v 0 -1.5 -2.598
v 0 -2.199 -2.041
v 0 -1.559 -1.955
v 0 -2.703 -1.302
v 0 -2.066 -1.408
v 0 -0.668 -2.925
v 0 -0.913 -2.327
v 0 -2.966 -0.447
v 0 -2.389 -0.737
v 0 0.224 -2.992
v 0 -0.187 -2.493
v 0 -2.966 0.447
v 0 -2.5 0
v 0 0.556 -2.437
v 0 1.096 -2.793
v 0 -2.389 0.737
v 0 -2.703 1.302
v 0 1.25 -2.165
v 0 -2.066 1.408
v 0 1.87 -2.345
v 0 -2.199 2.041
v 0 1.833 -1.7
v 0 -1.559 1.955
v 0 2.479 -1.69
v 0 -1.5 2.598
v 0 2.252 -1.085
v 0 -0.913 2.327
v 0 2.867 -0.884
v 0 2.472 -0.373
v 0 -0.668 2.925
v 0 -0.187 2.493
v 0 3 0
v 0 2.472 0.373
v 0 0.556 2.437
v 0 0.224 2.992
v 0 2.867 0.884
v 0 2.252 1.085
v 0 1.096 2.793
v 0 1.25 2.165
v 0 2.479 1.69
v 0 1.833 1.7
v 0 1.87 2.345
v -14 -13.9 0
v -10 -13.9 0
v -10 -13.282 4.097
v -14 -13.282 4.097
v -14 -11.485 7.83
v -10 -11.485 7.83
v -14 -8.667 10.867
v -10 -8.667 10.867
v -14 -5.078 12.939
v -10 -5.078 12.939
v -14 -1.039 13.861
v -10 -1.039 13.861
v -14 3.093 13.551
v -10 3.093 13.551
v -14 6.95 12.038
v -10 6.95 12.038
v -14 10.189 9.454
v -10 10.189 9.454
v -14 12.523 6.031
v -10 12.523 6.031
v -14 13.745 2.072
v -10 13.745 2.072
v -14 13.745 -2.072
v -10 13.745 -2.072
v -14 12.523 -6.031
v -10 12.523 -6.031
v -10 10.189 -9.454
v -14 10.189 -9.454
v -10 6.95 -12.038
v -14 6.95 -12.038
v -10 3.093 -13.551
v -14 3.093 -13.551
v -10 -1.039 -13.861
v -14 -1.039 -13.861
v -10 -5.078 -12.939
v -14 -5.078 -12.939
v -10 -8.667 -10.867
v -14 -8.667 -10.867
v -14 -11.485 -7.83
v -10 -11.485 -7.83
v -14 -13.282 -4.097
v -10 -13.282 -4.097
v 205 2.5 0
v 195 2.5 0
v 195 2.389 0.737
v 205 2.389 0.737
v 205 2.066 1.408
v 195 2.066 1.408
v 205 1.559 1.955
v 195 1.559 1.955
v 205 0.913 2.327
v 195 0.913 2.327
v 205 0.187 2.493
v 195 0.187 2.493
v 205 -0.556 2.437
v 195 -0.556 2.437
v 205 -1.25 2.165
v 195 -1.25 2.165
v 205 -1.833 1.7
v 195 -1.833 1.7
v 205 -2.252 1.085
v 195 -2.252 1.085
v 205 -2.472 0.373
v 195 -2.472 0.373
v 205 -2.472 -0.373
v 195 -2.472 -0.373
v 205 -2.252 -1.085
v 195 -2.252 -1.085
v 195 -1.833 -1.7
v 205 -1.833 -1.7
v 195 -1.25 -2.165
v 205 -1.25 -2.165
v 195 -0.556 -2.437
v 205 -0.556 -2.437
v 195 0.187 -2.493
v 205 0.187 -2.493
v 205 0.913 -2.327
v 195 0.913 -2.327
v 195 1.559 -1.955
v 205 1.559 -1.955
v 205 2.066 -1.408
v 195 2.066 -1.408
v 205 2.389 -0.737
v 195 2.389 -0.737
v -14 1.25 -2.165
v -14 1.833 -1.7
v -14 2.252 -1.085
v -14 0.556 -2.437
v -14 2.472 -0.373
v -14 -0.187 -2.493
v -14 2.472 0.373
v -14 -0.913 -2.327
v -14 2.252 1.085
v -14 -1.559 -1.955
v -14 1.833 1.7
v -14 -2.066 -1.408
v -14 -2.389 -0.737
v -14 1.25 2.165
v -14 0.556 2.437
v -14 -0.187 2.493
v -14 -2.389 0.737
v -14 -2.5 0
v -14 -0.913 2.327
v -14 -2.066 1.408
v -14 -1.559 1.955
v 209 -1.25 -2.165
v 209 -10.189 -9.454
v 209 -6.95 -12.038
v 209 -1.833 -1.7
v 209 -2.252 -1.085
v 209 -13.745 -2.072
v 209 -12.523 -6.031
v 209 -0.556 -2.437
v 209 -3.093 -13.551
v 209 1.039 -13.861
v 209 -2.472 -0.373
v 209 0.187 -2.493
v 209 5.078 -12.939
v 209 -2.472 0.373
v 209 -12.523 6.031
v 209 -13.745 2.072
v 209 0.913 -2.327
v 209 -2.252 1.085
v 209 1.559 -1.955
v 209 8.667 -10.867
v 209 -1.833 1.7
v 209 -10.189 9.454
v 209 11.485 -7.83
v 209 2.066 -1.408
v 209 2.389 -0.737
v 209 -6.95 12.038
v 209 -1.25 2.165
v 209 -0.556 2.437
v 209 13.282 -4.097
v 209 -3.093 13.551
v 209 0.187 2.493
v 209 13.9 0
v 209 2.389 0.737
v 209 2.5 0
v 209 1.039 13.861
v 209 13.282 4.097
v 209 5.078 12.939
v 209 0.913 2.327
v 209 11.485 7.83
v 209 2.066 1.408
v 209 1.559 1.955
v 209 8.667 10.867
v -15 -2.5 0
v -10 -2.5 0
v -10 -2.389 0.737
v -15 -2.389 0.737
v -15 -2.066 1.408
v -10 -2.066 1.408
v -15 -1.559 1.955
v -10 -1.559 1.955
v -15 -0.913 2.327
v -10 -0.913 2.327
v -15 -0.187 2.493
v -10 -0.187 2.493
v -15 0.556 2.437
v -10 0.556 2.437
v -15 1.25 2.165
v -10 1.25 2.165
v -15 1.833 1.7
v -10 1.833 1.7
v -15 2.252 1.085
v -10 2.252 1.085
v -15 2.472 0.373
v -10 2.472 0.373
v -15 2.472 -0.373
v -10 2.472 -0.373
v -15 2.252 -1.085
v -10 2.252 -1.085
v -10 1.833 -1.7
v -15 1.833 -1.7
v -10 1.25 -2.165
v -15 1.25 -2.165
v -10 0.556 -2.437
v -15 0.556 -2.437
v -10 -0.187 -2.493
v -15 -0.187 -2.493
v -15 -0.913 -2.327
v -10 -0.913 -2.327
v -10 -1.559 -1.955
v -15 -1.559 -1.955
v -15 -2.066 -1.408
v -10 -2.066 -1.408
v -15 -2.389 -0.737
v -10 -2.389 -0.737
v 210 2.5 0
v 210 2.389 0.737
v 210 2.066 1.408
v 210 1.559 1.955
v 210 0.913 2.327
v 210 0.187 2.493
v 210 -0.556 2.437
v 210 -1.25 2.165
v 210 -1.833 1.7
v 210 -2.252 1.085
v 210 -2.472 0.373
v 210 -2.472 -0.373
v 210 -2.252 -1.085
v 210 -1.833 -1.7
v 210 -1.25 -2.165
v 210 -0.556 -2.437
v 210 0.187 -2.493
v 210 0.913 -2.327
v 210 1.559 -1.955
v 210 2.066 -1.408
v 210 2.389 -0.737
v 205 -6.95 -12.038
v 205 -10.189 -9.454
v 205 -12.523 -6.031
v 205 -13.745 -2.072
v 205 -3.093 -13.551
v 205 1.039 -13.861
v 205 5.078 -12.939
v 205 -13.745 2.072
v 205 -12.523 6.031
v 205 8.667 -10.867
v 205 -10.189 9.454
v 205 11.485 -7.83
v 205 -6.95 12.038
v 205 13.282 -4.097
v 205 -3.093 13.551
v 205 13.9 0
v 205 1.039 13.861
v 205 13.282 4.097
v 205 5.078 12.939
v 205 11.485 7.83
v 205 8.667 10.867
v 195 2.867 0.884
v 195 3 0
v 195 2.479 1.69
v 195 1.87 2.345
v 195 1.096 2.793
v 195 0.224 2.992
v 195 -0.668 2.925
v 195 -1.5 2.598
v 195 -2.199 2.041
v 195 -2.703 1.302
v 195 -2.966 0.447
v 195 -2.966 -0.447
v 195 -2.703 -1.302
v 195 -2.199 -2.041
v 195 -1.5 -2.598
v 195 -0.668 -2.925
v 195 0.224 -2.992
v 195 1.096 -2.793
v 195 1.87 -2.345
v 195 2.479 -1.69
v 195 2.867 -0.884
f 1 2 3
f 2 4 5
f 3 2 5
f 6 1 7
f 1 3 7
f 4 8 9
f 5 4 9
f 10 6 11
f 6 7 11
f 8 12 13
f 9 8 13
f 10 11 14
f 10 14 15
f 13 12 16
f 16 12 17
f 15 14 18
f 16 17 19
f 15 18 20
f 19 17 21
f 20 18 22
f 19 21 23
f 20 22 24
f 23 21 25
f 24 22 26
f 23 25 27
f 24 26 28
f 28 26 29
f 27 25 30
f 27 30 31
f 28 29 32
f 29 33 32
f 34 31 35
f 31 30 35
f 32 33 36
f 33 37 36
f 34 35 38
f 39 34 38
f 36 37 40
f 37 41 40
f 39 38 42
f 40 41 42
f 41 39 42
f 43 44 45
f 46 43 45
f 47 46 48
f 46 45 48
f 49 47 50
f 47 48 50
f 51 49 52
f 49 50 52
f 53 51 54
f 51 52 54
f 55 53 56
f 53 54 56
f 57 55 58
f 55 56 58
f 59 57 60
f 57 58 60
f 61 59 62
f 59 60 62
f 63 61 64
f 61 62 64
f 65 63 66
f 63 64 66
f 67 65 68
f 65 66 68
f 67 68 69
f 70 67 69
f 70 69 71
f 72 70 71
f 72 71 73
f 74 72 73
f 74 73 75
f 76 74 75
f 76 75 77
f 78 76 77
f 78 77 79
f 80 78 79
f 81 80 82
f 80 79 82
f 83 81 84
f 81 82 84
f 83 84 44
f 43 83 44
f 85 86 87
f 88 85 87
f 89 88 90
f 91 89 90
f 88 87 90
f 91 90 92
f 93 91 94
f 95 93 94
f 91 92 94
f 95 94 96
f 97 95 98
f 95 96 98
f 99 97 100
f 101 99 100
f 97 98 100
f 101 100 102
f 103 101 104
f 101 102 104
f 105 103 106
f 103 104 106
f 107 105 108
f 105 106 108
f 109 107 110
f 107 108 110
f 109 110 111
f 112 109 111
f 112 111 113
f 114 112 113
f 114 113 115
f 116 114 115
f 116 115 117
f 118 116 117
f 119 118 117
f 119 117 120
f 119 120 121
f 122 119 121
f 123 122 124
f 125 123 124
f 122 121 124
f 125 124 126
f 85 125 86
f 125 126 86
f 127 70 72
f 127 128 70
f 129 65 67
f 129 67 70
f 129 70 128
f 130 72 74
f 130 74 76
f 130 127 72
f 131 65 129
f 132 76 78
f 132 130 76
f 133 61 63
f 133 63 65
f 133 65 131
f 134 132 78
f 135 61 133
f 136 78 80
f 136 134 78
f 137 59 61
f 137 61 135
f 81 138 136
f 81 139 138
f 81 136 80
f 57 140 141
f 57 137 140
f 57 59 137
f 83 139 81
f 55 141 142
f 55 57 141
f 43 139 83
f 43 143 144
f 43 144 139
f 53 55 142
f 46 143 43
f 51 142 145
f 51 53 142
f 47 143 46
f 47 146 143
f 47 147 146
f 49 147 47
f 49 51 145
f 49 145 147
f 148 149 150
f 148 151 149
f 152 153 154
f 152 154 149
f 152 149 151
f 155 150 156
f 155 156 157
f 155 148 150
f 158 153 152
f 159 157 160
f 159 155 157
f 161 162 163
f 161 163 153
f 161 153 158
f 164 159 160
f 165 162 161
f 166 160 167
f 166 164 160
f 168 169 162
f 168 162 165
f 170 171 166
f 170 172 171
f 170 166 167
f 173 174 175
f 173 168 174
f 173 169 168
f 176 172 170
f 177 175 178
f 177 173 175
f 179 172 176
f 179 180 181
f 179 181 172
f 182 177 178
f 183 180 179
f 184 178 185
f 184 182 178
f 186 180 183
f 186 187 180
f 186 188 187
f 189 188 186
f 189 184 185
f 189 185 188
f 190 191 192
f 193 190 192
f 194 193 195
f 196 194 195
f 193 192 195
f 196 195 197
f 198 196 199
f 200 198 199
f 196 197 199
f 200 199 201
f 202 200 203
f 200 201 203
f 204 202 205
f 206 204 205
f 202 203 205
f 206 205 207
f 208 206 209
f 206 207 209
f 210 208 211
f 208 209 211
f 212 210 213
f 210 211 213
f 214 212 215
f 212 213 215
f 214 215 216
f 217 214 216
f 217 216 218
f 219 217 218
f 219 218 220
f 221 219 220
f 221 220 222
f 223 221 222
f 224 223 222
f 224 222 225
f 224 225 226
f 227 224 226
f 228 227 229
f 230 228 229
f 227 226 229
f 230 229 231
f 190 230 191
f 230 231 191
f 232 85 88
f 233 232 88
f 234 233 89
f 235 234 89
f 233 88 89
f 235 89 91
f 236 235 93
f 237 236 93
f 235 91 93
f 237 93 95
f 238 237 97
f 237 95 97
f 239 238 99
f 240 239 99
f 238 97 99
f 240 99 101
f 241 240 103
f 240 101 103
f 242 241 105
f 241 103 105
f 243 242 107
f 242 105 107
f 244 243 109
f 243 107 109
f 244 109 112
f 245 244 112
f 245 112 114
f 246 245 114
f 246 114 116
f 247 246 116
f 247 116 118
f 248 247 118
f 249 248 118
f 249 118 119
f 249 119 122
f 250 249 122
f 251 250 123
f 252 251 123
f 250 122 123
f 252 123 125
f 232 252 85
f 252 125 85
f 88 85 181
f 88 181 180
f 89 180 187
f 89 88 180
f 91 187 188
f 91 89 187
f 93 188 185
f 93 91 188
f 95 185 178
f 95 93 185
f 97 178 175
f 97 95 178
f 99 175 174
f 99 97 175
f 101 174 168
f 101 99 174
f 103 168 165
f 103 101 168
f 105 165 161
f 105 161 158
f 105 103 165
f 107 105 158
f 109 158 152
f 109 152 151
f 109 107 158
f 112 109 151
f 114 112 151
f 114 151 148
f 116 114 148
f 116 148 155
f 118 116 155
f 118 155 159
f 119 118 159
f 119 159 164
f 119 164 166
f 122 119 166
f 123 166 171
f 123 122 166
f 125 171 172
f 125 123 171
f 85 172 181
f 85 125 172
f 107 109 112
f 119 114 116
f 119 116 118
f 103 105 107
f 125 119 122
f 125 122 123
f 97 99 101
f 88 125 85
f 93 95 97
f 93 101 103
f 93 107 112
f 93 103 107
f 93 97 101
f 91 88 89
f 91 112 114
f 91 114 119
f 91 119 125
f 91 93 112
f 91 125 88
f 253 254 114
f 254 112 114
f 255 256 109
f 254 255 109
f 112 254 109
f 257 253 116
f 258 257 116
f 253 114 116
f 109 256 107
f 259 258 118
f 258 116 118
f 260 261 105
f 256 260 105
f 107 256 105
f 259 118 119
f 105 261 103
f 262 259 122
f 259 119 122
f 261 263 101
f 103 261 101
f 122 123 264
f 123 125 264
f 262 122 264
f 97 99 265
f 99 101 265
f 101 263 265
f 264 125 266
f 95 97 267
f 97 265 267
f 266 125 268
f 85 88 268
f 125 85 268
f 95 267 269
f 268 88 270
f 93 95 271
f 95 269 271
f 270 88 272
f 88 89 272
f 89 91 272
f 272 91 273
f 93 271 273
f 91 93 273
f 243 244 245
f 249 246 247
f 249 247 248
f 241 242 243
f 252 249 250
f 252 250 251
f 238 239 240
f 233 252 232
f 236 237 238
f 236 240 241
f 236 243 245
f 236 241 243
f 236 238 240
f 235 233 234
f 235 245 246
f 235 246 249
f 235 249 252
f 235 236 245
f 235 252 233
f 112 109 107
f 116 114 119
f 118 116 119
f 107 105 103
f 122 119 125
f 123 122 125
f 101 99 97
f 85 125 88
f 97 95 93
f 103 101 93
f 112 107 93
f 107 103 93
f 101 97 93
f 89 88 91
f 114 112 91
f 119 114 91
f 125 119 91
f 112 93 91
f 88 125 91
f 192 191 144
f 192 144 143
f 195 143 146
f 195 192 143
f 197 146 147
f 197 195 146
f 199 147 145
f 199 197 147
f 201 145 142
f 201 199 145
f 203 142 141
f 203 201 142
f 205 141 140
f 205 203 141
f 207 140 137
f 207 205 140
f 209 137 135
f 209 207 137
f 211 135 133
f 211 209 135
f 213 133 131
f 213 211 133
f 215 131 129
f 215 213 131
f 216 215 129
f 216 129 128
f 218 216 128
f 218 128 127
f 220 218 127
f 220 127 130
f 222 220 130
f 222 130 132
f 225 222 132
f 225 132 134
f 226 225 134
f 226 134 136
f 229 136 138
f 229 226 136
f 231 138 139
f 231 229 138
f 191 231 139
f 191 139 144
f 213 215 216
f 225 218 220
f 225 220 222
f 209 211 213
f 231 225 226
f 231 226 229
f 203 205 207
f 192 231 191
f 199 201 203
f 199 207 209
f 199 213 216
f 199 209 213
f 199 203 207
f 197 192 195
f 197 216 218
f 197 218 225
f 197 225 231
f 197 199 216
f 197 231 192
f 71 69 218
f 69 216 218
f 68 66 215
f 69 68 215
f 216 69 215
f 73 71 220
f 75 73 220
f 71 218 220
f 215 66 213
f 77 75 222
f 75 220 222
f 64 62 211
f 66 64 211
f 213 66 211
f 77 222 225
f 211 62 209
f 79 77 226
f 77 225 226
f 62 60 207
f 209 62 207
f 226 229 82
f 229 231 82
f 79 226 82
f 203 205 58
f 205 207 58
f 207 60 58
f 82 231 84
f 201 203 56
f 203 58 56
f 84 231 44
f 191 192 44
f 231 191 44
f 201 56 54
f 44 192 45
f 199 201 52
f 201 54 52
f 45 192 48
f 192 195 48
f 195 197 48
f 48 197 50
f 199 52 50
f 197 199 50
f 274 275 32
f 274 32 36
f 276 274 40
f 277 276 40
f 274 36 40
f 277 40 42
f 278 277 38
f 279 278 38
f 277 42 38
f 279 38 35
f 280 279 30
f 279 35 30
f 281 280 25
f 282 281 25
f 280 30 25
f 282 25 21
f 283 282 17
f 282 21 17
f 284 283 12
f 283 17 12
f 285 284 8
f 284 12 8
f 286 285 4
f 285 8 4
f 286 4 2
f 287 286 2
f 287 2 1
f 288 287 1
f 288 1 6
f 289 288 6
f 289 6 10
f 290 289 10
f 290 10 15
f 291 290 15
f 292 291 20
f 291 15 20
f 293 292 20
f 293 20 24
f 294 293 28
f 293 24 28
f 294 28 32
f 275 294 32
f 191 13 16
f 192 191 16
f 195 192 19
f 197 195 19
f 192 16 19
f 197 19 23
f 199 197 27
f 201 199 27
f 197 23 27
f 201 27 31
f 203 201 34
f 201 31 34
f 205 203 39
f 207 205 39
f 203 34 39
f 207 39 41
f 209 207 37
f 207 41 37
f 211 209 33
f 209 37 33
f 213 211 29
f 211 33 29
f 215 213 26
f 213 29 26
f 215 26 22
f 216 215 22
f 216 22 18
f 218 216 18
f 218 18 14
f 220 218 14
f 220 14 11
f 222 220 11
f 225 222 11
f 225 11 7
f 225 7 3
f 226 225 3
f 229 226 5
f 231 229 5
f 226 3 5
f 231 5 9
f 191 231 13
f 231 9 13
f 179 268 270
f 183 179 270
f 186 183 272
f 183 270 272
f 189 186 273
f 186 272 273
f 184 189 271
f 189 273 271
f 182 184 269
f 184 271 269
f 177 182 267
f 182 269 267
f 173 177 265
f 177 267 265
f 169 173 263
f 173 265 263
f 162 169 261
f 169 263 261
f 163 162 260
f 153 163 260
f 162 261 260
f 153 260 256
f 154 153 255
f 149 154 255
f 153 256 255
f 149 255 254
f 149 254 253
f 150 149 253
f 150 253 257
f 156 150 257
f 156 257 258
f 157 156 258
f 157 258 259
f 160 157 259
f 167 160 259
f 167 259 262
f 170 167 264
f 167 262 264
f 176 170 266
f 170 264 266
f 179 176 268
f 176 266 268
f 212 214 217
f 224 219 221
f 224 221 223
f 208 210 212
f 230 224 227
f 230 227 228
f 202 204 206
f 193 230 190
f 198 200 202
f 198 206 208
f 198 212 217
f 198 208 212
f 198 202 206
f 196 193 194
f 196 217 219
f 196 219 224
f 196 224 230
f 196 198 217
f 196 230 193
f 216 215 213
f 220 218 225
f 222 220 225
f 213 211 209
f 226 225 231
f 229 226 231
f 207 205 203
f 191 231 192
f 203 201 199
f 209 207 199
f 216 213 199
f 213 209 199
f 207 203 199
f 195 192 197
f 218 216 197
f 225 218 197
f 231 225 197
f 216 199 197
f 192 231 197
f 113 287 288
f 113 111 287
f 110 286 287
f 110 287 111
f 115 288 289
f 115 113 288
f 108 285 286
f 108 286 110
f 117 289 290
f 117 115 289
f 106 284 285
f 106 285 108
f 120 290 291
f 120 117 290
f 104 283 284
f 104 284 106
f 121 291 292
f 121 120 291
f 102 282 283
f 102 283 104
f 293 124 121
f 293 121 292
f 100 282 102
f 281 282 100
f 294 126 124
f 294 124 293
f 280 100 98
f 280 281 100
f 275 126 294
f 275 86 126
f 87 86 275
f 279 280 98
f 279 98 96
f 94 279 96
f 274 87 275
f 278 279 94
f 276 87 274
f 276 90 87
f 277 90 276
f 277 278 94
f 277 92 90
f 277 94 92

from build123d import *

# Parameters (mm, degrees)
F0_R       = 3
F1_DEPTH   = 195
F2_R       = 2.5
F1_FACE1_R = 3
F3_DEPTH   = 10
F4_R       = 2.5
F5_DEPTH   = 10
F6_R       = 13.9
F6_R_2     = 2.5
F7_DEPTH   = 4
F8_R       = 2.5
F9_DEPTH   = 5
F10_R      = 13.9
F10_R_2    = 2.5
F11_DEPTH  = 4
F12_R      = 2.5
F13_DEPTH  = 5


with BuildPart() as f1:
    # F0 (on Right) → F1 (new body)
    with BuildSketch(Plane.YZ):
        Circle(F0_R)
    extrude(amount=F1_DEPTH)

    # F2 (on face) + F1_face1 (on face) → F3 (join)
    with BuildSketch(Plane(origin=(0, 0, 0), x_dir=(0, -1, 0), z_dir=(-1, 0, 0))):
        Circle(F2_R)
    with BuildSketch(Plane.YZ.offset(195)):
        Circle(F1_FACE1_R)
    extrude(amount=F3_DEPTH, dir=(-1, 0, 0))

    # F4 (on face) → F5 (join)
    with BuildSketch(Plane.YZ.offset(195)):
        Circle(F4_R)
    extrude(amount=F5_DEPTH)


with BuildPart() as f7:
    # F6 (on face) → F7 (new body)
    with BuildSketch(Plane(origin=(-10, 0, 0), x_dir=(0, -1, 0), z_dir=(-1, 0, 0))):
        Circle(F6_R)
        Circle(F6_R_2, mode=Mode.SUBTRACT)
    extrude(amount=F7_DEPTH)


with BuildPart() as f9:
    # F8 (on face) → F9 (new body)
    with BuildSketch(Plane(origin=(-10, 0, 0), x_dir=(0, -1, 0), z_dir=(-1, 0, 0))):
        Circle(F8_R)
    extrude(amount=F9_DEPTH)


with BuildPart() as f11:
    # F10 (on face) → F11 (new body)
    with BuildSketch(Plane.YZ.offset(205)):
        Circle(F10_R)
        Circle(F10_R_2, mode=Mode.SUBTRACT)
    extrude(amount=F11_DEPTH)


with BuildPart() as f13:
    # F12 (on face) → F13 (new body)
    with BuildSketch(Plane.YZ.offset(205)):
        Circle(F12_R)
    extrude(amount=F13_DEPTH)


solid = Compound([f1.part, f7.part, f9.part, f11.part, f13.part])
